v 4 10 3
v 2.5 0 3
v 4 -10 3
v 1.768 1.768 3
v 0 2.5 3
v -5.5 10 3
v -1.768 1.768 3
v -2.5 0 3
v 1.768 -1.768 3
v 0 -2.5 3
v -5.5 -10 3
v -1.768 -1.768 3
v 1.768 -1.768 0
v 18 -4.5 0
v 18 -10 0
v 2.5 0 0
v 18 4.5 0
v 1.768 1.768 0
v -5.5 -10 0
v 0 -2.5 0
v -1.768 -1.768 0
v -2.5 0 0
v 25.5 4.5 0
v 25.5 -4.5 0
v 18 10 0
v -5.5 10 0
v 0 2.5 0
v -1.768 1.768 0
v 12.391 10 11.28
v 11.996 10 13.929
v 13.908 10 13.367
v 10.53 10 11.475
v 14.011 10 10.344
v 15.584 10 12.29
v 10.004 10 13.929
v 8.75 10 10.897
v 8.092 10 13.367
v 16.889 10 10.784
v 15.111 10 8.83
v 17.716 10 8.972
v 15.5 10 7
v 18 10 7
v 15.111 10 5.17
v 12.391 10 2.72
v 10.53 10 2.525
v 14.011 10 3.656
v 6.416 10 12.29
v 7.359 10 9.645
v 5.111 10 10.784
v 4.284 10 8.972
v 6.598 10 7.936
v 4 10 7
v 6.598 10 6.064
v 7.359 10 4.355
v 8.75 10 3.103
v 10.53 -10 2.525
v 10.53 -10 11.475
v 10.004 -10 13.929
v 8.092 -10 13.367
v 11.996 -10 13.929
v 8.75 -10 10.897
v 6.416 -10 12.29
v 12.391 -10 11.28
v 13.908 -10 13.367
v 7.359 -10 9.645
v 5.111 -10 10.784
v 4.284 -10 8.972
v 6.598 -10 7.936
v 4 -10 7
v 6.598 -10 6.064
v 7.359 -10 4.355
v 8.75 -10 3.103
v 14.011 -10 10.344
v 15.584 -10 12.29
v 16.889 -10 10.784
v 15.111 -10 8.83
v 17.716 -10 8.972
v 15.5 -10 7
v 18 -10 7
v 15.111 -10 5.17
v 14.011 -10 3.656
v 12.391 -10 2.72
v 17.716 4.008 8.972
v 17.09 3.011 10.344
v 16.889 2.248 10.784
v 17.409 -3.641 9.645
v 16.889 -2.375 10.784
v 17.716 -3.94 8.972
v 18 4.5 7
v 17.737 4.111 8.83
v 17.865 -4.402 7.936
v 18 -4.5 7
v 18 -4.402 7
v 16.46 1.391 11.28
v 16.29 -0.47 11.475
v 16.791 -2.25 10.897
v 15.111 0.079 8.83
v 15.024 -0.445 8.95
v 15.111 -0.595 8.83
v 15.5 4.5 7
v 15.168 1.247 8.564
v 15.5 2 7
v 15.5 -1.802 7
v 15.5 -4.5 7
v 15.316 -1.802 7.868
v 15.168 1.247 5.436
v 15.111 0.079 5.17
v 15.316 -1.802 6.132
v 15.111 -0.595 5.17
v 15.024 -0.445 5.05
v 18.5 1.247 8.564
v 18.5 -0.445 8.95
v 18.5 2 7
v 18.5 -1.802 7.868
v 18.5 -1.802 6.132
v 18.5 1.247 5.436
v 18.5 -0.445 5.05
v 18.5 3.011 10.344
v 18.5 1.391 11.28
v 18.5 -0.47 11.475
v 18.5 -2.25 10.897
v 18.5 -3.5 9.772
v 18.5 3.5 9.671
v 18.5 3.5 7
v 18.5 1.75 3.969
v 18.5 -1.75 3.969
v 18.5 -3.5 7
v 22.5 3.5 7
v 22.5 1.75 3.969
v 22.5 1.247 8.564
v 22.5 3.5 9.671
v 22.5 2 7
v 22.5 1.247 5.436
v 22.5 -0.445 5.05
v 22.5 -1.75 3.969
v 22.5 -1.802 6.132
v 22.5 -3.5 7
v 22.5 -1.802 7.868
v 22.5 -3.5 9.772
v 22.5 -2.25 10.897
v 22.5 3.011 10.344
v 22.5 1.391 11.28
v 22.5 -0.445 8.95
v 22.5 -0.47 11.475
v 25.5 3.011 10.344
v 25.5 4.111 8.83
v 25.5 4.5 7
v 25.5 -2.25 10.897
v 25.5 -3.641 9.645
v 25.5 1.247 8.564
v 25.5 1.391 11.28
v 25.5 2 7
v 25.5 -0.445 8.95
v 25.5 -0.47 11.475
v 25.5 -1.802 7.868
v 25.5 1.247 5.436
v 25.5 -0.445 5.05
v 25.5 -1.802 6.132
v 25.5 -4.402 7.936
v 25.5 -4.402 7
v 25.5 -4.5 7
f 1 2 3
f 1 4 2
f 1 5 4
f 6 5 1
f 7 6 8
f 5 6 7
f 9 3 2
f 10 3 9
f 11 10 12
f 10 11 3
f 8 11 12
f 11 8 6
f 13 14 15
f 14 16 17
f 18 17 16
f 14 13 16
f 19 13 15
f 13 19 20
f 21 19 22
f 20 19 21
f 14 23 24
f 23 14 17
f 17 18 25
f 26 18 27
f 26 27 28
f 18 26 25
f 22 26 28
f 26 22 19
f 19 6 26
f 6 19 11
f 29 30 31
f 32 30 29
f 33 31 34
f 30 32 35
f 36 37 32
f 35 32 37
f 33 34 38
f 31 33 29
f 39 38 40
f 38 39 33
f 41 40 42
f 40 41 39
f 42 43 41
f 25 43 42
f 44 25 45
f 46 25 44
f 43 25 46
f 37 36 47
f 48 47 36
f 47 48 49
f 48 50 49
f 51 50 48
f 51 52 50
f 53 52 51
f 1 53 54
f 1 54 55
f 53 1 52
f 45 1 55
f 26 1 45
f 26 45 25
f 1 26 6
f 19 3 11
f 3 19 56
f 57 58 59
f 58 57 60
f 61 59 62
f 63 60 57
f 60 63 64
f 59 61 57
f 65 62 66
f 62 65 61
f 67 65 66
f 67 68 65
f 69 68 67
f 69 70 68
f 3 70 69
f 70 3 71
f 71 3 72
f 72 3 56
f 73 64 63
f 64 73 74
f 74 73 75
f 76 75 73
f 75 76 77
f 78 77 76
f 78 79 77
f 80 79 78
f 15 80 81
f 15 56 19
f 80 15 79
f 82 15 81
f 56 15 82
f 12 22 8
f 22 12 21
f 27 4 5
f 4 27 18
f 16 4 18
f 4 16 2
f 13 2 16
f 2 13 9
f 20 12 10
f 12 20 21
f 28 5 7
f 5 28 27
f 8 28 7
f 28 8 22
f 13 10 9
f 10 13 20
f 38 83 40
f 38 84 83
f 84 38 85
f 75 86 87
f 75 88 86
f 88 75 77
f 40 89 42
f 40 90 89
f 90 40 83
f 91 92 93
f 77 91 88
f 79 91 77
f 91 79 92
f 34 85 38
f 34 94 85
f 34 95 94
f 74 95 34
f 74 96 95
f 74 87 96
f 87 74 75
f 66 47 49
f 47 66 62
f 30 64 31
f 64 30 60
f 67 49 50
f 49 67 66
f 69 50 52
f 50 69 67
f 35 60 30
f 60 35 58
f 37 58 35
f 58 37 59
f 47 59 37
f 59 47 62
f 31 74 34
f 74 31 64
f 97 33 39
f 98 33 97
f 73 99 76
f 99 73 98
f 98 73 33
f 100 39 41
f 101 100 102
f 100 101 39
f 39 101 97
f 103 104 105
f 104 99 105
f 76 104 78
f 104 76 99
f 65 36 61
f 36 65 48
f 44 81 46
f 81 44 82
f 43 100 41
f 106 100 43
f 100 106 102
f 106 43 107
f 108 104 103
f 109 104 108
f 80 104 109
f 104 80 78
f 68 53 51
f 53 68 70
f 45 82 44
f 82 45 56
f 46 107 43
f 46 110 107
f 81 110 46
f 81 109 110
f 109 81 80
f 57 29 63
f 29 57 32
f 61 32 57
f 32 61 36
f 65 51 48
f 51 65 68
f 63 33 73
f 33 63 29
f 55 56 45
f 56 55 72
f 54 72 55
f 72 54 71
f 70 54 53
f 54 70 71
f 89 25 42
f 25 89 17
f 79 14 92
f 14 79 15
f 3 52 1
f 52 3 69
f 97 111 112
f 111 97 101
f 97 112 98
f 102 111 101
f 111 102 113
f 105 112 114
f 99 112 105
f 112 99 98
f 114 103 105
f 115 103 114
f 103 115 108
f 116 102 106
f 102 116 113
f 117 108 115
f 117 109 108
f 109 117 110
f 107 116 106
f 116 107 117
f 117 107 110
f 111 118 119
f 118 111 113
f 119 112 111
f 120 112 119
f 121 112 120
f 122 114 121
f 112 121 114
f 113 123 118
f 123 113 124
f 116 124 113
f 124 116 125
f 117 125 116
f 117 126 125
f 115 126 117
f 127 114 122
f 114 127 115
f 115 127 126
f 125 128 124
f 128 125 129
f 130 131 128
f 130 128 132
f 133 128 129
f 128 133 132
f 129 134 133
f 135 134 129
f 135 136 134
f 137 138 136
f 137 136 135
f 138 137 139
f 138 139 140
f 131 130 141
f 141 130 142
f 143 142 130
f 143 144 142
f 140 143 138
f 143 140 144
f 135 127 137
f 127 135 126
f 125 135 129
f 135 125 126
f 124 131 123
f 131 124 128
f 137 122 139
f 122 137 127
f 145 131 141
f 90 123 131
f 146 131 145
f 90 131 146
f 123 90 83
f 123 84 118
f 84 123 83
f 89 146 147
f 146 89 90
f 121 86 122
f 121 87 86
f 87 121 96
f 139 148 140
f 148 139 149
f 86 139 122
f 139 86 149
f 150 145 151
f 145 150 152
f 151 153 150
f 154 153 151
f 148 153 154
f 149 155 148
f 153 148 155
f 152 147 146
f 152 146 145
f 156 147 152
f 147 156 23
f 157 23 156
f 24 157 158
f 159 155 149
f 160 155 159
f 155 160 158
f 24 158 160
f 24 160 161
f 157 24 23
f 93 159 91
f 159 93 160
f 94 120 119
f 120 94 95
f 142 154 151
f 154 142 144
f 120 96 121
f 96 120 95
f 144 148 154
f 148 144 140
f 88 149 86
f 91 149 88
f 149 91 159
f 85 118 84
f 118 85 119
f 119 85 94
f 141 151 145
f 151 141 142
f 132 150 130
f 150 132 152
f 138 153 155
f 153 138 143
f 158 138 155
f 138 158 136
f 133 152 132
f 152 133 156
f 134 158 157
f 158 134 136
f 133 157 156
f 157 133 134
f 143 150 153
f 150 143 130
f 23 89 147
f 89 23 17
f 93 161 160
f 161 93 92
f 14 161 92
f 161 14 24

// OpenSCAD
/*******************
Coded  By:
Nick Anzalone, June 2012
Thingiverse Account: Acarius10
********************/

x=25.4; //Diameter of the Lens
y=10;   //Lens holder Thickness
z=3;     //Lens Holder Lip Size
X=25; //Base Diameter
Y=25;  //Base Height
a=3; //Set Screw Diameter
b=6; //Set Screw Nut Daimeter
c=3; //Set Screw Nut Thickness
d=8; //Guide Rod Diameter
e=20; //Guide Rod Length
f=3;    // Thumb Screw Head Height
g=6;   //Thumb Screw Head Diameter
i=3;    //Thumb Screw Diameter
j=3;    //PL Board Hole Diameter
k=4;   //Mirror holder Screw Diameter
//thumbscrew();

mirror_holder();

//***********Modules
module thumbscrew(){
difference(){
cylinder(f+2,(g+6)/2, (g+6)/2);
translate([0,0,2])cylinder(5,(g+1)/2, (g+1)/2);
cylinder(5,(i+1)/2, (i+1)/2);
}
difference(){
	for ( i = [0 :8] ){
					rotate( i * 360 / 8, [0, 0, 1])
					translate([(g+6)/2,0,0])
					cylinder(5,3,3);
		}	
translate([0,0,2])cylinder(5,(g+1)/2, (g+1)/2);
}
}

module mount(){
difference(){
cylinder((2/5)*Y,X/2,X/2);
translate([0,0,(1/5)*Y])cylinder(Y,(d+1)/2,(d+1)/2);
}
difference(){
translate([0,0,(2/5)*Y])cylinder((2/5)*Y,X/2,(d+6)/2);
cylinder(Y,(d+1)/2,(d+1)/2);

}
difference(){
translate([0,0,(4/5)*Y])cylinder((1/5)*Y,(d+6)/2,(d+6)/2);
cylinder(Y,(d+1)/2,(d+1)/2);

}
difference(){
translate([0,(X/2)+3,0])cylinder(5,(j+6)/2, (j+6)/2);
translate([0,(X/2)+3,0])cylinder(5,(j+1)/2, (j+1)/2);
}
difference(){
translate([0,(X/2)-2,5/2])cube([j+6,j+6,5],center = true);
translate([0,(X/2)+3,0])cylinder(5,(j+1)/2, (j+1)/2);
}
}

module lens_holder(){
difference(){
cylinder(y/2,(x+10)/2,(x+10)/2);
cylinder((y+2)/2,(x-3)/2,(x-3)/2);
translate([0,0,1.5])cylinder((y+2)/2,(x+1)/2,(x+1)/2);
translate([0,(x+10)/2+5,(b+3)/2])rotate([90,0,0])cylinder(10,(a+1)/2,(a+1)/2);
translate([0,(x+8)/2,(b+3)/2])nuttrap();
translate([(x+15)/2,e/2,(d+6)/2])rotate([90,0,0])cylinder(e,(d+6)/2, (d+6)/2);
}
difference(){
translate([0,0,y/2])cylinder((y)/2,(x+5)/2,(x+5)/2);
cylinder((y)*2,(x+1)/2,(x+1)/2);
translate([0,(x+10)/2+5,(b+3)/2])rotate([90,0,0])cylinder(25,(b+3)/2,(b+3)/2);
translate([0,(x+8)/2,(b+3)/2])nuttrap();
}
difference(){
translate([0,(x+8)/2,0])set_screw((b+3)/2);
cylinder((y+2),(x+1)/2,(x+1)/2);
}
difference(){
translate([(x+15)/2,0,0])guide_rod();
rotate([0,0,90]){
translate([0,((x+7)/-2)-((d)),(d+6)/2])rotate([90,0,0])cylinder(50,(a+1)/2,(a+1)/2);
translate([((x+7.5)/2)+((d+6)),0,0])rotate([0,0,90])set_screw1((d+6)/2);
}
}
translate([((x+7.5)/2)+((d+6)),0,0])rotate([0,0,90])set_screw((d+6)/2);
}


module mirror_holder(){
difference(){
translate([0,0,1.5])cube([k+7,e,3],center = true);
cylinder(10,(k+1)/2,(k+1)/2);
}
difference(){
translate([(k+7),0,0])guide_rod();
rotate([0,0,90]){
translate([0,((x+7)/-2)-((d)),(d+6)/2])rotate([90,0,0])cylinder(50,(a+1)/2,(a+1)/2);
translate([((x+7.5)/2)+((d+6)),0,0])rotate([0,0,90])set_screw1((d+6)/2);
translate([0,-10,(d+6)/2])rotate([90,0,0])cylinder(200,(a+1)/2, (a+1)/2);
}
}
translate([((k+9)/2)+((d+6)),0,0])rotate([0,0,90])set_screw((d+6)/2);
}

module guide_rod(){
difference(){
translate([0,e/2,(d+6)/2])rotate([90,0,0])cylinder(e,(d+6)/2, (d+6)/2);
translate([0,(e/2)+1,(d+6)/2])rotate([90,0,0])cylinder(e+2,(d+1)/2, (d+1)/2);
}
difference(){
translate([0,0,(d+6)/4])cube([(d+6),e,(d+6)/2], center = true);
translate([0,(e/2)+1,(d+6)/2])rotate([90,0,0])cylinder(e+2,(d+1)/2, (d+1)/2);
}
}

module set_screw(h){
difference(){
translate([0,5,h])rotate([90,0,0])cylinder(10,(b+3)/2, (b+3)/2);
translate([0,10,h])rotate([90,0,0])cylinder(200,(a+1)/2, (a+1)/2);
translate([0,0,h])nuttrap();
}
difference(){
translate([0,0,h/2])cube([(b+3),10,h], center = true);
translate([0,6,h])rotate([90,0,0])cylinder(12,(a+1)/2, (a+1)/2);
translate([0,0,h])nuttrap();
}
}
module set_screw1(h){
translate([0,5,h])rotate([90,0,0])cylinder(10,(b+3)/2, (b+3)/2);
translate([0,0,h/2])cube([(b+3),10,h], center = true);


}



module nuttrap(){
translate([0,(c+1)/2,0])rotate([90,0,0])hexagon(c+1,(b+1)/2);
translate([0,0,(b*3)/2])cube([b+1,c+1,b*3],center = true);
}

module reg_polygon(sides,radius)
{
  function dia(r) = sqrt(pow(r*2,2)/2);  //sqrt((r*2^2)/2) if only we had an exponention op
  if(sides<2) square([radius,0]);
  if(sides==3) triangle(radius);
  if(sides==4) square([dia(radius),dia(radius)],center=true);
  if(sides>4) circle(r=radius,$fn=sides);
}

module hexagonf(radius)
{
  reg_polygon(6,radius);
}

module hexagon(height,radius) 
{
  linear_extrude(height=height) hexagonf(radius);
}
